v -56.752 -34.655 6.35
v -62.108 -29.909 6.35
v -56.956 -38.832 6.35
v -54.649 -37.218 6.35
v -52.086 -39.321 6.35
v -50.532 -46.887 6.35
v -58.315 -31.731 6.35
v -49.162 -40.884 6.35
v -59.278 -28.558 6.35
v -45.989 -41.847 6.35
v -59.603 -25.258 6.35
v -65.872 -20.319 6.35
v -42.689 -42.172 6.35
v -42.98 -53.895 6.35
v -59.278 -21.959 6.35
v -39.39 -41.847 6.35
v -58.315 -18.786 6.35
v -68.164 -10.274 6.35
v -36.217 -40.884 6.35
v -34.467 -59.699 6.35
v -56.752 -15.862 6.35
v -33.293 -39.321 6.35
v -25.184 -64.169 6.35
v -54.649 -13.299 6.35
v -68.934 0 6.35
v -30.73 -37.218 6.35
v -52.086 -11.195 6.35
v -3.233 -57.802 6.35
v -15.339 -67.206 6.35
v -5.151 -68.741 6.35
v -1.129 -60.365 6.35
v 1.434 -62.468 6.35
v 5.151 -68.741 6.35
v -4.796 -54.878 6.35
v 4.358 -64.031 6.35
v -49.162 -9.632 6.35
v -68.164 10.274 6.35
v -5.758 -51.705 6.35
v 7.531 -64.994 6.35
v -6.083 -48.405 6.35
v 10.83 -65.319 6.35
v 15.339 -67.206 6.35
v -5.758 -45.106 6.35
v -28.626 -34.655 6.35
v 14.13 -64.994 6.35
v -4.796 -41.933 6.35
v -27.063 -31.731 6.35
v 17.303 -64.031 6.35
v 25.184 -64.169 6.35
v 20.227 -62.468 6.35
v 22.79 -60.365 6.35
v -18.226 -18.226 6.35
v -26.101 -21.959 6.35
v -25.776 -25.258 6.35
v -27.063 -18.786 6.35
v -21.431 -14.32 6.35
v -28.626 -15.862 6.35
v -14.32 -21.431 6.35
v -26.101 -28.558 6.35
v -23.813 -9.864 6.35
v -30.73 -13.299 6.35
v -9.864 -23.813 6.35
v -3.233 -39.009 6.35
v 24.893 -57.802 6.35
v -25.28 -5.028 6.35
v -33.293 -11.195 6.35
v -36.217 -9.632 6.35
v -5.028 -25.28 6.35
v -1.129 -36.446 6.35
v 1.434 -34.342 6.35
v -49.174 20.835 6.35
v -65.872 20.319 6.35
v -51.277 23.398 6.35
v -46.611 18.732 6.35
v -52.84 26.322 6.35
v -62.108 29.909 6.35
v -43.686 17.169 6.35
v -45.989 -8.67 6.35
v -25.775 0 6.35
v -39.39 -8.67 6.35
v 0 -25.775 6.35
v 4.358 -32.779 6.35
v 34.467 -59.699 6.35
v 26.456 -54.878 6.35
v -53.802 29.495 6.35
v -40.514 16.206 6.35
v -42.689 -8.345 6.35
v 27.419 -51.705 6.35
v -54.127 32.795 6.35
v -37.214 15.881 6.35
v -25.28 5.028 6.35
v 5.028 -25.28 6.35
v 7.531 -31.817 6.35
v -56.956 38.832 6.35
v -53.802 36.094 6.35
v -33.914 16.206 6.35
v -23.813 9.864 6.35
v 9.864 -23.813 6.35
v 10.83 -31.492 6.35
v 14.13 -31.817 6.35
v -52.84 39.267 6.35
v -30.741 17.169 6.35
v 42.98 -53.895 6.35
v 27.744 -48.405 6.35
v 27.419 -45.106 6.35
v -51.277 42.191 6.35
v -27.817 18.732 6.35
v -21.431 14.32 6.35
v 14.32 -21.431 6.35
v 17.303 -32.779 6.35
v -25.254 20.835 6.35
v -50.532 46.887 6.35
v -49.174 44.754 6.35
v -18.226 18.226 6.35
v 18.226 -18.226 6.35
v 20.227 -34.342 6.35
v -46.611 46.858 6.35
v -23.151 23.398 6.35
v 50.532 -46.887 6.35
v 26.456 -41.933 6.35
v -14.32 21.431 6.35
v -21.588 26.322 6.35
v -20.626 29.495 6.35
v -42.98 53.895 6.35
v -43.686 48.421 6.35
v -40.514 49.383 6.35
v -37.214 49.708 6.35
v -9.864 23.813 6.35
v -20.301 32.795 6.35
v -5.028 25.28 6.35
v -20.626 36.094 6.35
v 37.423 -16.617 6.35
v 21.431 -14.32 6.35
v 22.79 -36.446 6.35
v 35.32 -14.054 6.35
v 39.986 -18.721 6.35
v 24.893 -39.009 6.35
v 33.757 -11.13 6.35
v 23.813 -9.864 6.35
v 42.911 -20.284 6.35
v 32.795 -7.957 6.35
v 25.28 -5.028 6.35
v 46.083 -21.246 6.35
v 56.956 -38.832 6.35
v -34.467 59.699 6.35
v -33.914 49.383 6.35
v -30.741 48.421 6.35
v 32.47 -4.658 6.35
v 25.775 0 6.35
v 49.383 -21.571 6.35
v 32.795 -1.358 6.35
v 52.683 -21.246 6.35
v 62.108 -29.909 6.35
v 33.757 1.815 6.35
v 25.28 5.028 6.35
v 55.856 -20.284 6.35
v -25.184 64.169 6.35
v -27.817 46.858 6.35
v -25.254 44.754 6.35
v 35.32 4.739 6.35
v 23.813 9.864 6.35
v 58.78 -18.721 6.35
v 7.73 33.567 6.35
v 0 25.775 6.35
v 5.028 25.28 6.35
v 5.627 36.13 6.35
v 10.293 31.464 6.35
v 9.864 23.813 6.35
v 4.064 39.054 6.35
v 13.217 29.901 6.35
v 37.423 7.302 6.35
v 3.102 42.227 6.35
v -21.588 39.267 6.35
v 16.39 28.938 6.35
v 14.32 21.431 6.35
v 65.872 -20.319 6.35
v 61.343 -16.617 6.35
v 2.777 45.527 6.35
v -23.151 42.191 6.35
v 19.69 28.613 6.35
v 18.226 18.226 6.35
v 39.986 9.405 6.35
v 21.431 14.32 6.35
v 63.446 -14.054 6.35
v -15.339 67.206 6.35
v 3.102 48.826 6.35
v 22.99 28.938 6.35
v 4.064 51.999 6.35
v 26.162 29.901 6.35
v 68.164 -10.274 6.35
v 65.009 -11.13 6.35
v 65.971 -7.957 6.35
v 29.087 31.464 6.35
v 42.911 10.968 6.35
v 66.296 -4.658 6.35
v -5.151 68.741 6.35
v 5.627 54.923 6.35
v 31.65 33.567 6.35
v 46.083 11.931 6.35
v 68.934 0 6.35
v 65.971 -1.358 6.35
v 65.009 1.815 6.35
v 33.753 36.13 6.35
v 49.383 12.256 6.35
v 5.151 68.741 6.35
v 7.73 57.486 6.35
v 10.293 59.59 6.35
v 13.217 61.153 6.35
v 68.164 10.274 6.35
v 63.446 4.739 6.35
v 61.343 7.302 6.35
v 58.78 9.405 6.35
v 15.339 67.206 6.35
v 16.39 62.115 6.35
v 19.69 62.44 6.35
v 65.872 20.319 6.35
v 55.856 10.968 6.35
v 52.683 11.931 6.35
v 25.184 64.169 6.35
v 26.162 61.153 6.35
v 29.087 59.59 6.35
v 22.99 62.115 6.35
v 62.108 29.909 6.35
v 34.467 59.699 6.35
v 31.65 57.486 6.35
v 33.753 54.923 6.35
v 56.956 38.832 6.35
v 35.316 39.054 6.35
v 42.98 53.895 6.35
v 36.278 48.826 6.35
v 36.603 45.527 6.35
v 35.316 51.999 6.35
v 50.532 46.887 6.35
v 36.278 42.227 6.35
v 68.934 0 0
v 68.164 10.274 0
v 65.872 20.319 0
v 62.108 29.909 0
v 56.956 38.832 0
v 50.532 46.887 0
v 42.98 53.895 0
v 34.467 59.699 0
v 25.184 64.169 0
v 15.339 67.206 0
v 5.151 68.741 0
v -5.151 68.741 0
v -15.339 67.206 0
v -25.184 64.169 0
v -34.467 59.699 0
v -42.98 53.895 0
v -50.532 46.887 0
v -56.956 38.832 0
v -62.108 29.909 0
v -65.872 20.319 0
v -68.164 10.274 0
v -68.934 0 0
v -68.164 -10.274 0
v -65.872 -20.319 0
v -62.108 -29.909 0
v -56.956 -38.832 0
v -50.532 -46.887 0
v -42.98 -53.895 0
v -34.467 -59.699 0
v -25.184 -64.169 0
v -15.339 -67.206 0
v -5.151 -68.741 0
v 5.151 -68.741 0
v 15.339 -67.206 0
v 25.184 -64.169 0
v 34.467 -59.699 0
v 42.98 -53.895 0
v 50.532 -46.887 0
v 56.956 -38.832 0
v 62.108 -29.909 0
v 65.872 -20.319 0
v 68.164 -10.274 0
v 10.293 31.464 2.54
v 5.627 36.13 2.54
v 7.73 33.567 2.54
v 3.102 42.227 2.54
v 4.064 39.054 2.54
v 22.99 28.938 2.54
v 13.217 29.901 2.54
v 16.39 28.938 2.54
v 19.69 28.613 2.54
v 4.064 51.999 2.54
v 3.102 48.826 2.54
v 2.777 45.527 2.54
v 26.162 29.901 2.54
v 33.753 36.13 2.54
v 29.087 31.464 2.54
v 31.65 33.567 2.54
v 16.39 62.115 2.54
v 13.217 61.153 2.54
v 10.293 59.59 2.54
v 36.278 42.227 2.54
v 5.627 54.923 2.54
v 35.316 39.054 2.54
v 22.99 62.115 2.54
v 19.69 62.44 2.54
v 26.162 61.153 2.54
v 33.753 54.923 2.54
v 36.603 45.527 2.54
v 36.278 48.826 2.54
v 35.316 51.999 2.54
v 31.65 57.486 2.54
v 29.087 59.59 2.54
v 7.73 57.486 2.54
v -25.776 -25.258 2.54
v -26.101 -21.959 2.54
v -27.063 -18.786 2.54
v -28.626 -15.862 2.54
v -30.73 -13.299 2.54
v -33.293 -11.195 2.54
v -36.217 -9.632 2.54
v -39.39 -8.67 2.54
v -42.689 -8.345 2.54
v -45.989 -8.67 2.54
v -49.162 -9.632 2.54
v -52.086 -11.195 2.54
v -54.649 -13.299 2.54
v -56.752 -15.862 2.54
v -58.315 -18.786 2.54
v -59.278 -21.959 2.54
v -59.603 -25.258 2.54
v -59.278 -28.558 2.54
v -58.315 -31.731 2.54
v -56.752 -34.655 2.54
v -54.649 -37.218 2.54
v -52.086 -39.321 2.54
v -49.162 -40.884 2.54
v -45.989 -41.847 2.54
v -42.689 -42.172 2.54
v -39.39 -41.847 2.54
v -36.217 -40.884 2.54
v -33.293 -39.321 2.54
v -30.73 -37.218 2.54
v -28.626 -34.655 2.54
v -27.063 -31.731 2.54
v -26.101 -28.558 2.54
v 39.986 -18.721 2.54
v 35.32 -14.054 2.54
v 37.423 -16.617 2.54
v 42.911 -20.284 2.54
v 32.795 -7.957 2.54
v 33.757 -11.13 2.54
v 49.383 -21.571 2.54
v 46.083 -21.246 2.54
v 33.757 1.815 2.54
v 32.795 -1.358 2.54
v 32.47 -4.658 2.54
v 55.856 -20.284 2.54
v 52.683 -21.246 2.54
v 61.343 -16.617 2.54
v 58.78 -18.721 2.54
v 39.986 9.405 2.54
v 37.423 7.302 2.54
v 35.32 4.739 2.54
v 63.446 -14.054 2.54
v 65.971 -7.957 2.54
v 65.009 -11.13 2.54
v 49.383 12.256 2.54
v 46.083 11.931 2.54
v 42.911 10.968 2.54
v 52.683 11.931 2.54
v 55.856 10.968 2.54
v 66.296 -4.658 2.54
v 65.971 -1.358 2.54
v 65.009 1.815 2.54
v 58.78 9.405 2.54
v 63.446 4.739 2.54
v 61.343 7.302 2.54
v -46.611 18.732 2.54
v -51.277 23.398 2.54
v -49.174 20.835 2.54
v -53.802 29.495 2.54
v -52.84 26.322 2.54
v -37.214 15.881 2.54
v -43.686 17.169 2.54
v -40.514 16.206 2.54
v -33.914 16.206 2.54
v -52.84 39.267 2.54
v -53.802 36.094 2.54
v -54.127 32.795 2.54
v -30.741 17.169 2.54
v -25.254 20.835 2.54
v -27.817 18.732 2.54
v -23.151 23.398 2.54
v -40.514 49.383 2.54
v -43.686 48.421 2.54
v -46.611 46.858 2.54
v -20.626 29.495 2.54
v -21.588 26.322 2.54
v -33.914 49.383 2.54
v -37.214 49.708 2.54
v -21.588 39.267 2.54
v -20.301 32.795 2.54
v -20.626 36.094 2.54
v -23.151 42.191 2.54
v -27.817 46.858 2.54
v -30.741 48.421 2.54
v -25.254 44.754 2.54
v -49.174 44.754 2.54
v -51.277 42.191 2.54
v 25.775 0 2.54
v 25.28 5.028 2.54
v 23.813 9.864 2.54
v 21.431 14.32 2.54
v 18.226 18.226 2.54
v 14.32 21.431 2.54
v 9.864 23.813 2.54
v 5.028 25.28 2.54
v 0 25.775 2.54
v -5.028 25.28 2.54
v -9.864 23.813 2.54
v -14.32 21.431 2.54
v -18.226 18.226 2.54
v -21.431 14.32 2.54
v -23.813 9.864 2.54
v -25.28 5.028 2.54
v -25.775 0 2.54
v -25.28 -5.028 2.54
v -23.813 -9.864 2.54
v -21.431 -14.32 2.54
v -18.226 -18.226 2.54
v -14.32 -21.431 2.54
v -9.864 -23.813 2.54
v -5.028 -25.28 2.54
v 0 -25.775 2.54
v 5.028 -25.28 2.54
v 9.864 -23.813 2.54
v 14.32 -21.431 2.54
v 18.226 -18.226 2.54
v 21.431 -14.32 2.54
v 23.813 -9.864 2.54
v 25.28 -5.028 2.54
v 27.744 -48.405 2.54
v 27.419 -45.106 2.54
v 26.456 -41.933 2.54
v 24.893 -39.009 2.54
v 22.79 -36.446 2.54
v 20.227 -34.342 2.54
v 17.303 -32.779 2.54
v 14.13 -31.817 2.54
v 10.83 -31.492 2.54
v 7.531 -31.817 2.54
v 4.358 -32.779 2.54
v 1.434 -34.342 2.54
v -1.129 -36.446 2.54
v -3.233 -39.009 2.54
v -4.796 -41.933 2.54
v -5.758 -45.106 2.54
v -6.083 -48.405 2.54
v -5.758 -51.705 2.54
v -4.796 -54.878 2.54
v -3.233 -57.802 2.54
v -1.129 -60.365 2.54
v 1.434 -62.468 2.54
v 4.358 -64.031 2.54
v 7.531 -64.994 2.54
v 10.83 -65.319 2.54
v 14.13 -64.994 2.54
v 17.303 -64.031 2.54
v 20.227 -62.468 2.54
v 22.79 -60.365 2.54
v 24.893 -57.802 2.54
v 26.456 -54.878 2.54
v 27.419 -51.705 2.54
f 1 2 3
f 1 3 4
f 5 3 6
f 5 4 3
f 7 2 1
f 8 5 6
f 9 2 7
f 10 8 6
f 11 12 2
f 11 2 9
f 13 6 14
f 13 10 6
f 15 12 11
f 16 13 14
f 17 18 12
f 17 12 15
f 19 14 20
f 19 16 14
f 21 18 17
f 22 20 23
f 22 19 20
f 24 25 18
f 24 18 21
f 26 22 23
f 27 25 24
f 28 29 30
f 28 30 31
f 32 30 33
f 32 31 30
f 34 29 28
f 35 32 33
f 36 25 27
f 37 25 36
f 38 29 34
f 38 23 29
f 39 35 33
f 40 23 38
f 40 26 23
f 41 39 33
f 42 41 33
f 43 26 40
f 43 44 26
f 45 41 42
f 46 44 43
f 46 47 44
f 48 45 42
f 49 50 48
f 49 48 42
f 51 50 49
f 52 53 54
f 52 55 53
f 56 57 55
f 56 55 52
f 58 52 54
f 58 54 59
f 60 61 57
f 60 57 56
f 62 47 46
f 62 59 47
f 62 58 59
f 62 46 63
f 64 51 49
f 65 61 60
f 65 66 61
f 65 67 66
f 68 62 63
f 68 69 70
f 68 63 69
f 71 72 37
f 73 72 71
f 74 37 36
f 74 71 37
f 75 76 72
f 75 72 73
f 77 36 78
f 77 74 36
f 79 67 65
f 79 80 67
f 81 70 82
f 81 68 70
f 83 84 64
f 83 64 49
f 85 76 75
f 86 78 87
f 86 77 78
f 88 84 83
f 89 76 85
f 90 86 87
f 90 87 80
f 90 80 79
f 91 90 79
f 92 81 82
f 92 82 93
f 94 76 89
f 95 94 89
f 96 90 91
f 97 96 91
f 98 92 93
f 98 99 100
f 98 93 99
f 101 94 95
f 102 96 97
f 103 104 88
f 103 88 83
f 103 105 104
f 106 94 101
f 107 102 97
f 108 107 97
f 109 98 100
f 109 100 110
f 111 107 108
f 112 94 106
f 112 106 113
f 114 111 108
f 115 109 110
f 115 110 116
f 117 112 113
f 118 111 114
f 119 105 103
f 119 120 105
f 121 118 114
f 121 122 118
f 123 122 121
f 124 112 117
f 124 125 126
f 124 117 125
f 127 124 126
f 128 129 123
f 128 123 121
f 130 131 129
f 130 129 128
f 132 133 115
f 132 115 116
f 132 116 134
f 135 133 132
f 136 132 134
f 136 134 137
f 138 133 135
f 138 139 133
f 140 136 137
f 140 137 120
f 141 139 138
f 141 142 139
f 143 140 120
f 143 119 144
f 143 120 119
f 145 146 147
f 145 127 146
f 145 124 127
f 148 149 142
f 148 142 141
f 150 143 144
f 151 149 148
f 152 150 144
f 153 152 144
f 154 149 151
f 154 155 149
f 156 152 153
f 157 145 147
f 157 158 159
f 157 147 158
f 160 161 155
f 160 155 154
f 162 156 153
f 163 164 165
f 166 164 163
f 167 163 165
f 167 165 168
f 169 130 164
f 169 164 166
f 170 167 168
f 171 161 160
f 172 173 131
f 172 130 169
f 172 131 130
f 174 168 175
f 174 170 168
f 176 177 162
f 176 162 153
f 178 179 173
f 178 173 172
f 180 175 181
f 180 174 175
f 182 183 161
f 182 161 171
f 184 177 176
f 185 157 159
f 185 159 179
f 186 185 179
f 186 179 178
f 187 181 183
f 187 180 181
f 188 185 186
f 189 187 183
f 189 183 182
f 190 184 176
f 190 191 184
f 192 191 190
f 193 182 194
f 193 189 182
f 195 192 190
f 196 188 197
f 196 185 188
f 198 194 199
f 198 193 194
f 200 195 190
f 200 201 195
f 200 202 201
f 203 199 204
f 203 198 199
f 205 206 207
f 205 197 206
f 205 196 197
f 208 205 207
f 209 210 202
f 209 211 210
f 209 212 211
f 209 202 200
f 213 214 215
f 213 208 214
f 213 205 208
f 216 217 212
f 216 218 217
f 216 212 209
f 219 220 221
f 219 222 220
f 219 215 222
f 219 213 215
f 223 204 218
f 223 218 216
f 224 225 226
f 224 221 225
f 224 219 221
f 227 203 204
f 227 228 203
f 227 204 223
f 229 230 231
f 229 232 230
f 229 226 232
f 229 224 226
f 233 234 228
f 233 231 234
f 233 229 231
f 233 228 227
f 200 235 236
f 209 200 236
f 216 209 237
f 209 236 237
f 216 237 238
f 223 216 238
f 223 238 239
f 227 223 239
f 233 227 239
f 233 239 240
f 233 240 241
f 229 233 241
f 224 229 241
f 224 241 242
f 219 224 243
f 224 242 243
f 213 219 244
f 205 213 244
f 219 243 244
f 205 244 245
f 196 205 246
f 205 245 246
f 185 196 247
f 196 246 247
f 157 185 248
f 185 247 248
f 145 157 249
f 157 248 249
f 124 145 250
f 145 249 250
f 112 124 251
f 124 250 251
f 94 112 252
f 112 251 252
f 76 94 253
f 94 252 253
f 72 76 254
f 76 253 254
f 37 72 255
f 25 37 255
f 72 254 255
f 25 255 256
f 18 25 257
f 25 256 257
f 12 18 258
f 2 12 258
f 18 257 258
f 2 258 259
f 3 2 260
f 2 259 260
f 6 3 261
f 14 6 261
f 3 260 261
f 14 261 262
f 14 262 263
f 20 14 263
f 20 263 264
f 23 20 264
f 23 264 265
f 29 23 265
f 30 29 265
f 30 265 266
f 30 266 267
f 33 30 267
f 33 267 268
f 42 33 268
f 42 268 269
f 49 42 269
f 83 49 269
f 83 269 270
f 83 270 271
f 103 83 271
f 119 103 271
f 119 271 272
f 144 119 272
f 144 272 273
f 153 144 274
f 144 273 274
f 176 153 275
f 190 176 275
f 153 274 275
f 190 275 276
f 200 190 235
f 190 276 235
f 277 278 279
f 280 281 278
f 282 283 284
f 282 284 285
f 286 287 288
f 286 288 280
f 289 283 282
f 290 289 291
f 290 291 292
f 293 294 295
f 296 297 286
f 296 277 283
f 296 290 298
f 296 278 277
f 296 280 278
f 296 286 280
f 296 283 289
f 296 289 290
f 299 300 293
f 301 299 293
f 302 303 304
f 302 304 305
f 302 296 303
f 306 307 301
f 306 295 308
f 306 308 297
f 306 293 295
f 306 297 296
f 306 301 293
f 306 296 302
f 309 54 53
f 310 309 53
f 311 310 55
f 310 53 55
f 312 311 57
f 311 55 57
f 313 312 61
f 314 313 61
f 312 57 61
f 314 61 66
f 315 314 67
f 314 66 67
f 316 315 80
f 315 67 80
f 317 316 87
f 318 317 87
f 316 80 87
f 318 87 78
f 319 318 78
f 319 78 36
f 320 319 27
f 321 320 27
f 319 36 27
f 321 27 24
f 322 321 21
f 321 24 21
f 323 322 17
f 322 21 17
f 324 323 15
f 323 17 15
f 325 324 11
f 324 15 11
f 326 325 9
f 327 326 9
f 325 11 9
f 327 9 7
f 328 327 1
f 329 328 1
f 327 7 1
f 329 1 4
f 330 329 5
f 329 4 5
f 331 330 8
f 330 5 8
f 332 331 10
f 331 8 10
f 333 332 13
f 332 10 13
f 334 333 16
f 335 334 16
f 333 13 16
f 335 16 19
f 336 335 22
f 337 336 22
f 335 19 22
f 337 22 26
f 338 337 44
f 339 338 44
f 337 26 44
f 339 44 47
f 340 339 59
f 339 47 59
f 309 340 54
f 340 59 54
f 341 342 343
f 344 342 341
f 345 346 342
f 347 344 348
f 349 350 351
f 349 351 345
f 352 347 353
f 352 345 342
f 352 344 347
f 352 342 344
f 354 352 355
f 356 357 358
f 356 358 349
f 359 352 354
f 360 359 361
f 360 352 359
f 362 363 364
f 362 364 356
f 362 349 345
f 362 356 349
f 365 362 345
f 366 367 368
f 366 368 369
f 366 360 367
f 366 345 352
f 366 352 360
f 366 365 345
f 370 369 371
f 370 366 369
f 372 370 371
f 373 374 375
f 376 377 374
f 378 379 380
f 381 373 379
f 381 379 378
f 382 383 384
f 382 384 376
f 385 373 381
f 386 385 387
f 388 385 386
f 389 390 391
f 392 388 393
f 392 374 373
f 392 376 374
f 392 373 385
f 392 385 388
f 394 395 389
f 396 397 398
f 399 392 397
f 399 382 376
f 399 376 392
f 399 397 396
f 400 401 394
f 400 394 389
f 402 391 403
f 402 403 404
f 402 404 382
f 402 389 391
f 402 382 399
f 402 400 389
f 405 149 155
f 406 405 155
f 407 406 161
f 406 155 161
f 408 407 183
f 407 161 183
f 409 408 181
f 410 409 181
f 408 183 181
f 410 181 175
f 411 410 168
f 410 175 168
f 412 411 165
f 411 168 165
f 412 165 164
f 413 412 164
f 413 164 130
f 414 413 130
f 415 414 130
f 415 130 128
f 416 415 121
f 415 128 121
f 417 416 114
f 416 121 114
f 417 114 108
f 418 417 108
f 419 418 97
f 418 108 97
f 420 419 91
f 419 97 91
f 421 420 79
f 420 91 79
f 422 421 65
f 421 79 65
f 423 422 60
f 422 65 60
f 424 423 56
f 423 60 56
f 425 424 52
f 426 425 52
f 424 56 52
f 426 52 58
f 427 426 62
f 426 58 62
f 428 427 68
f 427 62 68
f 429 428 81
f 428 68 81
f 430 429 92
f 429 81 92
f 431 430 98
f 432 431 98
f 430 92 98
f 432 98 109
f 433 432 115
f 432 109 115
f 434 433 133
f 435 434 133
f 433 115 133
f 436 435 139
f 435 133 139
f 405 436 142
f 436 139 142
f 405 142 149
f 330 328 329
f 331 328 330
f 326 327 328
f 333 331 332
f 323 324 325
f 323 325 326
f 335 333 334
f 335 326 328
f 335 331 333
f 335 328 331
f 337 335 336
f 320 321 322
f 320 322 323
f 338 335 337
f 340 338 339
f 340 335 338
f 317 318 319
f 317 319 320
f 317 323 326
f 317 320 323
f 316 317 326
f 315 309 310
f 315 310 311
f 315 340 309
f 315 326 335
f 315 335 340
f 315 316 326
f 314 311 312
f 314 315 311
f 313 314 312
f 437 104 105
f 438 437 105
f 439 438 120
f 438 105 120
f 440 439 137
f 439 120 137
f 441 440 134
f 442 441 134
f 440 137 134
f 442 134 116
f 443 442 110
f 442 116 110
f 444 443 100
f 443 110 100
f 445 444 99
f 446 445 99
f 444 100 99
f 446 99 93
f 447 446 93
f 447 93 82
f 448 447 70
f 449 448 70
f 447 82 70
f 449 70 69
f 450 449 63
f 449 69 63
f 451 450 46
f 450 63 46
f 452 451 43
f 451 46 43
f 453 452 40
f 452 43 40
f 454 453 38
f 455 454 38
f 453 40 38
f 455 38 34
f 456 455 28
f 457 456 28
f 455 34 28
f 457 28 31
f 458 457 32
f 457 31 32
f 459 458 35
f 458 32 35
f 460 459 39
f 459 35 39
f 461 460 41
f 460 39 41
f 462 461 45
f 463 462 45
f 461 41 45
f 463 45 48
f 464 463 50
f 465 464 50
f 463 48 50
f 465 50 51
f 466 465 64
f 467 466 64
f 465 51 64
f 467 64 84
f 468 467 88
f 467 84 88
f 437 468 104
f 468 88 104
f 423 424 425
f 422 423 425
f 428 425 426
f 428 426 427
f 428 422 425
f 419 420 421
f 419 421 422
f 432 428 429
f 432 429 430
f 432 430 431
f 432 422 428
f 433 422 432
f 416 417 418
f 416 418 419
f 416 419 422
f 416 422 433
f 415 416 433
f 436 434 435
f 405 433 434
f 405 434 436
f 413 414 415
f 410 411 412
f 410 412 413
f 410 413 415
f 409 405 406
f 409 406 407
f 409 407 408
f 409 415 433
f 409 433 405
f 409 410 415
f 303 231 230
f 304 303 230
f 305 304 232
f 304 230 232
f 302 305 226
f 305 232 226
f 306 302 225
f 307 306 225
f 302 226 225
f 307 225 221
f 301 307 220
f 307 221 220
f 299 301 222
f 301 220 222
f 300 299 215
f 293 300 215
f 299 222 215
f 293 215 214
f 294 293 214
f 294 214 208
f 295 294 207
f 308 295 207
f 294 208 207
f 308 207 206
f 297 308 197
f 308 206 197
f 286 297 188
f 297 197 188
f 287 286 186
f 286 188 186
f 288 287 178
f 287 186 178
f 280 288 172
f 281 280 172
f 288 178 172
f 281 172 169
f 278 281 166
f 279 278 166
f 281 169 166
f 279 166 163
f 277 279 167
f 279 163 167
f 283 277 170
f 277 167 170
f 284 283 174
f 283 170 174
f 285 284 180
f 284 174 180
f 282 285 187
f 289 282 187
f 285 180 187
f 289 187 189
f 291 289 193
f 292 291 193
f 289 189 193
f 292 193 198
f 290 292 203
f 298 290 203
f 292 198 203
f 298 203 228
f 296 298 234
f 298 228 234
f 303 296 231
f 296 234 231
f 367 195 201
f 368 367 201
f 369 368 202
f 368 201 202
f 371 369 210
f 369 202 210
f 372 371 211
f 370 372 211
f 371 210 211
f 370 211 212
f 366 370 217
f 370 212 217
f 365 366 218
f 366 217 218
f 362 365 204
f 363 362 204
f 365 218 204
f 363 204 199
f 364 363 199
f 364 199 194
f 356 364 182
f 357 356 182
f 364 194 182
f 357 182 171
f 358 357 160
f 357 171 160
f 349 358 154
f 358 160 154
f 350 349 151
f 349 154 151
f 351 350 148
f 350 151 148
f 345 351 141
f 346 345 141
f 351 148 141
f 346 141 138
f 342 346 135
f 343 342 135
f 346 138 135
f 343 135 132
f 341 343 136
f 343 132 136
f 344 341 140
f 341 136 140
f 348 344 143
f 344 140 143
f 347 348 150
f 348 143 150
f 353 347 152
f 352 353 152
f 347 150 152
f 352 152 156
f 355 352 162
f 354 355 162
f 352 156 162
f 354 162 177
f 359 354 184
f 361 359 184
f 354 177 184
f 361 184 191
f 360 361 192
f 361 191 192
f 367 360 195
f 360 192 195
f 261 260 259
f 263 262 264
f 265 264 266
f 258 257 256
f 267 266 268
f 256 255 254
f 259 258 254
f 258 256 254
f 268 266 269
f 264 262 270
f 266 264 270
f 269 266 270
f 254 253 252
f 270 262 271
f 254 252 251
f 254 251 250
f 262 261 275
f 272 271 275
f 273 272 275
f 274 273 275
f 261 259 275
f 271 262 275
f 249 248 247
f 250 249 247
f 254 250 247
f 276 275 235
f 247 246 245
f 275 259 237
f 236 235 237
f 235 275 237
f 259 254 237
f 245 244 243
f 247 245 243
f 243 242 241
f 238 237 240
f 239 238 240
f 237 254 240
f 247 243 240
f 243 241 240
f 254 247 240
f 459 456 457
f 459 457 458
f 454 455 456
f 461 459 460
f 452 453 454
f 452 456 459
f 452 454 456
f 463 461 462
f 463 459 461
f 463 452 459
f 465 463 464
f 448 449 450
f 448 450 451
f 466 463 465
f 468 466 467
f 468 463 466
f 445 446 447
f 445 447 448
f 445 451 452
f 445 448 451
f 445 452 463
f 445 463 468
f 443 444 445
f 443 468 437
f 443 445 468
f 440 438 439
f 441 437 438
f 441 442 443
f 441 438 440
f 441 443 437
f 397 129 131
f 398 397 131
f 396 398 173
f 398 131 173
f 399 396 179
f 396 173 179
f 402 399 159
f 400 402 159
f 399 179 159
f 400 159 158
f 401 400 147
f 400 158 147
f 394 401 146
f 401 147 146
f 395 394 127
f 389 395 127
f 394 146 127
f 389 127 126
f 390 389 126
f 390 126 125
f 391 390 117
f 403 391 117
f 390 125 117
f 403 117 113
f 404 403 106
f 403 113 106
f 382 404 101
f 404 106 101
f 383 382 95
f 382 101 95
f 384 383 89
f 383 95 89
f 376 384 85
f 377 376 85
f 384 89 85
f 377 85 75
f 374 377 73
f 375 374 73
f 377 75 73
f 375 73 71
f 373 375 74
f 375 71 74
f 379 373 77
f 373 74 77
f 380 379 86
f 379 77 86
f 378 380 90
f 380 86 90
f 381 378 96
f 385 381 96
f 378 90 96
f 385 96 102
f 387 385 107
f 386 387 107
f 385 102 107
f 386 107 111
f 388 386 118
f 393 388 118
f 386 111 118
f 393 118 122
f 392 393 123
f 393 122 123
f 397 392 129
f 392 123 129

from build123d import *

# Parameters (mm, degrees)
F0_R     = 68.9341581071
F1_DEPTH = 6.35
F2_R     = 25.775239711
F3_DEPTH = 3.81
F5_R     = 16.9134232358
F6_DEPTH = 3.81


# Not quite as in the source:
# - a feature names something its author has since deleted; it is built from what else it names


with BuildPart() as f1:
    # F0 (on Top) → F1 (new body)
    with BuildSketch(Plane.XY):
        Circle(F0_R)
    extrude(amount=F1_DEPTH)

    # F2 (on face) → F3 (cut)
    with BuildSketch(Plane.XY.offset(6.35)):
        Circle(F2_R)
    extrude(amount=-F3_DEPTH, mode=Mode.SUBTRACT)

    # F5 (on face) → F6 (cut)
    with BuildSketch(Plane.XY.offset(6.35)):
        with Locations((-42.6894489161, -25.2584252012)):
            Circle(F5_R)
        with Locations((-37.2139550745, 32.7947959304)):
            Circle(F5_R)
        with Locations((19.6899598242, 45.5267237403)):
            Circle(F5_R)
        with Locations((49.383019483, -4.6577332624)):
            Circle(F5_R)
        with Locations((10.8304246834, -48.405361207)):
            Circle(F5_R)
    extrude(amount=-F6_DEPTH, mode=Mode.SUBTRACT)


solid = f1.part
